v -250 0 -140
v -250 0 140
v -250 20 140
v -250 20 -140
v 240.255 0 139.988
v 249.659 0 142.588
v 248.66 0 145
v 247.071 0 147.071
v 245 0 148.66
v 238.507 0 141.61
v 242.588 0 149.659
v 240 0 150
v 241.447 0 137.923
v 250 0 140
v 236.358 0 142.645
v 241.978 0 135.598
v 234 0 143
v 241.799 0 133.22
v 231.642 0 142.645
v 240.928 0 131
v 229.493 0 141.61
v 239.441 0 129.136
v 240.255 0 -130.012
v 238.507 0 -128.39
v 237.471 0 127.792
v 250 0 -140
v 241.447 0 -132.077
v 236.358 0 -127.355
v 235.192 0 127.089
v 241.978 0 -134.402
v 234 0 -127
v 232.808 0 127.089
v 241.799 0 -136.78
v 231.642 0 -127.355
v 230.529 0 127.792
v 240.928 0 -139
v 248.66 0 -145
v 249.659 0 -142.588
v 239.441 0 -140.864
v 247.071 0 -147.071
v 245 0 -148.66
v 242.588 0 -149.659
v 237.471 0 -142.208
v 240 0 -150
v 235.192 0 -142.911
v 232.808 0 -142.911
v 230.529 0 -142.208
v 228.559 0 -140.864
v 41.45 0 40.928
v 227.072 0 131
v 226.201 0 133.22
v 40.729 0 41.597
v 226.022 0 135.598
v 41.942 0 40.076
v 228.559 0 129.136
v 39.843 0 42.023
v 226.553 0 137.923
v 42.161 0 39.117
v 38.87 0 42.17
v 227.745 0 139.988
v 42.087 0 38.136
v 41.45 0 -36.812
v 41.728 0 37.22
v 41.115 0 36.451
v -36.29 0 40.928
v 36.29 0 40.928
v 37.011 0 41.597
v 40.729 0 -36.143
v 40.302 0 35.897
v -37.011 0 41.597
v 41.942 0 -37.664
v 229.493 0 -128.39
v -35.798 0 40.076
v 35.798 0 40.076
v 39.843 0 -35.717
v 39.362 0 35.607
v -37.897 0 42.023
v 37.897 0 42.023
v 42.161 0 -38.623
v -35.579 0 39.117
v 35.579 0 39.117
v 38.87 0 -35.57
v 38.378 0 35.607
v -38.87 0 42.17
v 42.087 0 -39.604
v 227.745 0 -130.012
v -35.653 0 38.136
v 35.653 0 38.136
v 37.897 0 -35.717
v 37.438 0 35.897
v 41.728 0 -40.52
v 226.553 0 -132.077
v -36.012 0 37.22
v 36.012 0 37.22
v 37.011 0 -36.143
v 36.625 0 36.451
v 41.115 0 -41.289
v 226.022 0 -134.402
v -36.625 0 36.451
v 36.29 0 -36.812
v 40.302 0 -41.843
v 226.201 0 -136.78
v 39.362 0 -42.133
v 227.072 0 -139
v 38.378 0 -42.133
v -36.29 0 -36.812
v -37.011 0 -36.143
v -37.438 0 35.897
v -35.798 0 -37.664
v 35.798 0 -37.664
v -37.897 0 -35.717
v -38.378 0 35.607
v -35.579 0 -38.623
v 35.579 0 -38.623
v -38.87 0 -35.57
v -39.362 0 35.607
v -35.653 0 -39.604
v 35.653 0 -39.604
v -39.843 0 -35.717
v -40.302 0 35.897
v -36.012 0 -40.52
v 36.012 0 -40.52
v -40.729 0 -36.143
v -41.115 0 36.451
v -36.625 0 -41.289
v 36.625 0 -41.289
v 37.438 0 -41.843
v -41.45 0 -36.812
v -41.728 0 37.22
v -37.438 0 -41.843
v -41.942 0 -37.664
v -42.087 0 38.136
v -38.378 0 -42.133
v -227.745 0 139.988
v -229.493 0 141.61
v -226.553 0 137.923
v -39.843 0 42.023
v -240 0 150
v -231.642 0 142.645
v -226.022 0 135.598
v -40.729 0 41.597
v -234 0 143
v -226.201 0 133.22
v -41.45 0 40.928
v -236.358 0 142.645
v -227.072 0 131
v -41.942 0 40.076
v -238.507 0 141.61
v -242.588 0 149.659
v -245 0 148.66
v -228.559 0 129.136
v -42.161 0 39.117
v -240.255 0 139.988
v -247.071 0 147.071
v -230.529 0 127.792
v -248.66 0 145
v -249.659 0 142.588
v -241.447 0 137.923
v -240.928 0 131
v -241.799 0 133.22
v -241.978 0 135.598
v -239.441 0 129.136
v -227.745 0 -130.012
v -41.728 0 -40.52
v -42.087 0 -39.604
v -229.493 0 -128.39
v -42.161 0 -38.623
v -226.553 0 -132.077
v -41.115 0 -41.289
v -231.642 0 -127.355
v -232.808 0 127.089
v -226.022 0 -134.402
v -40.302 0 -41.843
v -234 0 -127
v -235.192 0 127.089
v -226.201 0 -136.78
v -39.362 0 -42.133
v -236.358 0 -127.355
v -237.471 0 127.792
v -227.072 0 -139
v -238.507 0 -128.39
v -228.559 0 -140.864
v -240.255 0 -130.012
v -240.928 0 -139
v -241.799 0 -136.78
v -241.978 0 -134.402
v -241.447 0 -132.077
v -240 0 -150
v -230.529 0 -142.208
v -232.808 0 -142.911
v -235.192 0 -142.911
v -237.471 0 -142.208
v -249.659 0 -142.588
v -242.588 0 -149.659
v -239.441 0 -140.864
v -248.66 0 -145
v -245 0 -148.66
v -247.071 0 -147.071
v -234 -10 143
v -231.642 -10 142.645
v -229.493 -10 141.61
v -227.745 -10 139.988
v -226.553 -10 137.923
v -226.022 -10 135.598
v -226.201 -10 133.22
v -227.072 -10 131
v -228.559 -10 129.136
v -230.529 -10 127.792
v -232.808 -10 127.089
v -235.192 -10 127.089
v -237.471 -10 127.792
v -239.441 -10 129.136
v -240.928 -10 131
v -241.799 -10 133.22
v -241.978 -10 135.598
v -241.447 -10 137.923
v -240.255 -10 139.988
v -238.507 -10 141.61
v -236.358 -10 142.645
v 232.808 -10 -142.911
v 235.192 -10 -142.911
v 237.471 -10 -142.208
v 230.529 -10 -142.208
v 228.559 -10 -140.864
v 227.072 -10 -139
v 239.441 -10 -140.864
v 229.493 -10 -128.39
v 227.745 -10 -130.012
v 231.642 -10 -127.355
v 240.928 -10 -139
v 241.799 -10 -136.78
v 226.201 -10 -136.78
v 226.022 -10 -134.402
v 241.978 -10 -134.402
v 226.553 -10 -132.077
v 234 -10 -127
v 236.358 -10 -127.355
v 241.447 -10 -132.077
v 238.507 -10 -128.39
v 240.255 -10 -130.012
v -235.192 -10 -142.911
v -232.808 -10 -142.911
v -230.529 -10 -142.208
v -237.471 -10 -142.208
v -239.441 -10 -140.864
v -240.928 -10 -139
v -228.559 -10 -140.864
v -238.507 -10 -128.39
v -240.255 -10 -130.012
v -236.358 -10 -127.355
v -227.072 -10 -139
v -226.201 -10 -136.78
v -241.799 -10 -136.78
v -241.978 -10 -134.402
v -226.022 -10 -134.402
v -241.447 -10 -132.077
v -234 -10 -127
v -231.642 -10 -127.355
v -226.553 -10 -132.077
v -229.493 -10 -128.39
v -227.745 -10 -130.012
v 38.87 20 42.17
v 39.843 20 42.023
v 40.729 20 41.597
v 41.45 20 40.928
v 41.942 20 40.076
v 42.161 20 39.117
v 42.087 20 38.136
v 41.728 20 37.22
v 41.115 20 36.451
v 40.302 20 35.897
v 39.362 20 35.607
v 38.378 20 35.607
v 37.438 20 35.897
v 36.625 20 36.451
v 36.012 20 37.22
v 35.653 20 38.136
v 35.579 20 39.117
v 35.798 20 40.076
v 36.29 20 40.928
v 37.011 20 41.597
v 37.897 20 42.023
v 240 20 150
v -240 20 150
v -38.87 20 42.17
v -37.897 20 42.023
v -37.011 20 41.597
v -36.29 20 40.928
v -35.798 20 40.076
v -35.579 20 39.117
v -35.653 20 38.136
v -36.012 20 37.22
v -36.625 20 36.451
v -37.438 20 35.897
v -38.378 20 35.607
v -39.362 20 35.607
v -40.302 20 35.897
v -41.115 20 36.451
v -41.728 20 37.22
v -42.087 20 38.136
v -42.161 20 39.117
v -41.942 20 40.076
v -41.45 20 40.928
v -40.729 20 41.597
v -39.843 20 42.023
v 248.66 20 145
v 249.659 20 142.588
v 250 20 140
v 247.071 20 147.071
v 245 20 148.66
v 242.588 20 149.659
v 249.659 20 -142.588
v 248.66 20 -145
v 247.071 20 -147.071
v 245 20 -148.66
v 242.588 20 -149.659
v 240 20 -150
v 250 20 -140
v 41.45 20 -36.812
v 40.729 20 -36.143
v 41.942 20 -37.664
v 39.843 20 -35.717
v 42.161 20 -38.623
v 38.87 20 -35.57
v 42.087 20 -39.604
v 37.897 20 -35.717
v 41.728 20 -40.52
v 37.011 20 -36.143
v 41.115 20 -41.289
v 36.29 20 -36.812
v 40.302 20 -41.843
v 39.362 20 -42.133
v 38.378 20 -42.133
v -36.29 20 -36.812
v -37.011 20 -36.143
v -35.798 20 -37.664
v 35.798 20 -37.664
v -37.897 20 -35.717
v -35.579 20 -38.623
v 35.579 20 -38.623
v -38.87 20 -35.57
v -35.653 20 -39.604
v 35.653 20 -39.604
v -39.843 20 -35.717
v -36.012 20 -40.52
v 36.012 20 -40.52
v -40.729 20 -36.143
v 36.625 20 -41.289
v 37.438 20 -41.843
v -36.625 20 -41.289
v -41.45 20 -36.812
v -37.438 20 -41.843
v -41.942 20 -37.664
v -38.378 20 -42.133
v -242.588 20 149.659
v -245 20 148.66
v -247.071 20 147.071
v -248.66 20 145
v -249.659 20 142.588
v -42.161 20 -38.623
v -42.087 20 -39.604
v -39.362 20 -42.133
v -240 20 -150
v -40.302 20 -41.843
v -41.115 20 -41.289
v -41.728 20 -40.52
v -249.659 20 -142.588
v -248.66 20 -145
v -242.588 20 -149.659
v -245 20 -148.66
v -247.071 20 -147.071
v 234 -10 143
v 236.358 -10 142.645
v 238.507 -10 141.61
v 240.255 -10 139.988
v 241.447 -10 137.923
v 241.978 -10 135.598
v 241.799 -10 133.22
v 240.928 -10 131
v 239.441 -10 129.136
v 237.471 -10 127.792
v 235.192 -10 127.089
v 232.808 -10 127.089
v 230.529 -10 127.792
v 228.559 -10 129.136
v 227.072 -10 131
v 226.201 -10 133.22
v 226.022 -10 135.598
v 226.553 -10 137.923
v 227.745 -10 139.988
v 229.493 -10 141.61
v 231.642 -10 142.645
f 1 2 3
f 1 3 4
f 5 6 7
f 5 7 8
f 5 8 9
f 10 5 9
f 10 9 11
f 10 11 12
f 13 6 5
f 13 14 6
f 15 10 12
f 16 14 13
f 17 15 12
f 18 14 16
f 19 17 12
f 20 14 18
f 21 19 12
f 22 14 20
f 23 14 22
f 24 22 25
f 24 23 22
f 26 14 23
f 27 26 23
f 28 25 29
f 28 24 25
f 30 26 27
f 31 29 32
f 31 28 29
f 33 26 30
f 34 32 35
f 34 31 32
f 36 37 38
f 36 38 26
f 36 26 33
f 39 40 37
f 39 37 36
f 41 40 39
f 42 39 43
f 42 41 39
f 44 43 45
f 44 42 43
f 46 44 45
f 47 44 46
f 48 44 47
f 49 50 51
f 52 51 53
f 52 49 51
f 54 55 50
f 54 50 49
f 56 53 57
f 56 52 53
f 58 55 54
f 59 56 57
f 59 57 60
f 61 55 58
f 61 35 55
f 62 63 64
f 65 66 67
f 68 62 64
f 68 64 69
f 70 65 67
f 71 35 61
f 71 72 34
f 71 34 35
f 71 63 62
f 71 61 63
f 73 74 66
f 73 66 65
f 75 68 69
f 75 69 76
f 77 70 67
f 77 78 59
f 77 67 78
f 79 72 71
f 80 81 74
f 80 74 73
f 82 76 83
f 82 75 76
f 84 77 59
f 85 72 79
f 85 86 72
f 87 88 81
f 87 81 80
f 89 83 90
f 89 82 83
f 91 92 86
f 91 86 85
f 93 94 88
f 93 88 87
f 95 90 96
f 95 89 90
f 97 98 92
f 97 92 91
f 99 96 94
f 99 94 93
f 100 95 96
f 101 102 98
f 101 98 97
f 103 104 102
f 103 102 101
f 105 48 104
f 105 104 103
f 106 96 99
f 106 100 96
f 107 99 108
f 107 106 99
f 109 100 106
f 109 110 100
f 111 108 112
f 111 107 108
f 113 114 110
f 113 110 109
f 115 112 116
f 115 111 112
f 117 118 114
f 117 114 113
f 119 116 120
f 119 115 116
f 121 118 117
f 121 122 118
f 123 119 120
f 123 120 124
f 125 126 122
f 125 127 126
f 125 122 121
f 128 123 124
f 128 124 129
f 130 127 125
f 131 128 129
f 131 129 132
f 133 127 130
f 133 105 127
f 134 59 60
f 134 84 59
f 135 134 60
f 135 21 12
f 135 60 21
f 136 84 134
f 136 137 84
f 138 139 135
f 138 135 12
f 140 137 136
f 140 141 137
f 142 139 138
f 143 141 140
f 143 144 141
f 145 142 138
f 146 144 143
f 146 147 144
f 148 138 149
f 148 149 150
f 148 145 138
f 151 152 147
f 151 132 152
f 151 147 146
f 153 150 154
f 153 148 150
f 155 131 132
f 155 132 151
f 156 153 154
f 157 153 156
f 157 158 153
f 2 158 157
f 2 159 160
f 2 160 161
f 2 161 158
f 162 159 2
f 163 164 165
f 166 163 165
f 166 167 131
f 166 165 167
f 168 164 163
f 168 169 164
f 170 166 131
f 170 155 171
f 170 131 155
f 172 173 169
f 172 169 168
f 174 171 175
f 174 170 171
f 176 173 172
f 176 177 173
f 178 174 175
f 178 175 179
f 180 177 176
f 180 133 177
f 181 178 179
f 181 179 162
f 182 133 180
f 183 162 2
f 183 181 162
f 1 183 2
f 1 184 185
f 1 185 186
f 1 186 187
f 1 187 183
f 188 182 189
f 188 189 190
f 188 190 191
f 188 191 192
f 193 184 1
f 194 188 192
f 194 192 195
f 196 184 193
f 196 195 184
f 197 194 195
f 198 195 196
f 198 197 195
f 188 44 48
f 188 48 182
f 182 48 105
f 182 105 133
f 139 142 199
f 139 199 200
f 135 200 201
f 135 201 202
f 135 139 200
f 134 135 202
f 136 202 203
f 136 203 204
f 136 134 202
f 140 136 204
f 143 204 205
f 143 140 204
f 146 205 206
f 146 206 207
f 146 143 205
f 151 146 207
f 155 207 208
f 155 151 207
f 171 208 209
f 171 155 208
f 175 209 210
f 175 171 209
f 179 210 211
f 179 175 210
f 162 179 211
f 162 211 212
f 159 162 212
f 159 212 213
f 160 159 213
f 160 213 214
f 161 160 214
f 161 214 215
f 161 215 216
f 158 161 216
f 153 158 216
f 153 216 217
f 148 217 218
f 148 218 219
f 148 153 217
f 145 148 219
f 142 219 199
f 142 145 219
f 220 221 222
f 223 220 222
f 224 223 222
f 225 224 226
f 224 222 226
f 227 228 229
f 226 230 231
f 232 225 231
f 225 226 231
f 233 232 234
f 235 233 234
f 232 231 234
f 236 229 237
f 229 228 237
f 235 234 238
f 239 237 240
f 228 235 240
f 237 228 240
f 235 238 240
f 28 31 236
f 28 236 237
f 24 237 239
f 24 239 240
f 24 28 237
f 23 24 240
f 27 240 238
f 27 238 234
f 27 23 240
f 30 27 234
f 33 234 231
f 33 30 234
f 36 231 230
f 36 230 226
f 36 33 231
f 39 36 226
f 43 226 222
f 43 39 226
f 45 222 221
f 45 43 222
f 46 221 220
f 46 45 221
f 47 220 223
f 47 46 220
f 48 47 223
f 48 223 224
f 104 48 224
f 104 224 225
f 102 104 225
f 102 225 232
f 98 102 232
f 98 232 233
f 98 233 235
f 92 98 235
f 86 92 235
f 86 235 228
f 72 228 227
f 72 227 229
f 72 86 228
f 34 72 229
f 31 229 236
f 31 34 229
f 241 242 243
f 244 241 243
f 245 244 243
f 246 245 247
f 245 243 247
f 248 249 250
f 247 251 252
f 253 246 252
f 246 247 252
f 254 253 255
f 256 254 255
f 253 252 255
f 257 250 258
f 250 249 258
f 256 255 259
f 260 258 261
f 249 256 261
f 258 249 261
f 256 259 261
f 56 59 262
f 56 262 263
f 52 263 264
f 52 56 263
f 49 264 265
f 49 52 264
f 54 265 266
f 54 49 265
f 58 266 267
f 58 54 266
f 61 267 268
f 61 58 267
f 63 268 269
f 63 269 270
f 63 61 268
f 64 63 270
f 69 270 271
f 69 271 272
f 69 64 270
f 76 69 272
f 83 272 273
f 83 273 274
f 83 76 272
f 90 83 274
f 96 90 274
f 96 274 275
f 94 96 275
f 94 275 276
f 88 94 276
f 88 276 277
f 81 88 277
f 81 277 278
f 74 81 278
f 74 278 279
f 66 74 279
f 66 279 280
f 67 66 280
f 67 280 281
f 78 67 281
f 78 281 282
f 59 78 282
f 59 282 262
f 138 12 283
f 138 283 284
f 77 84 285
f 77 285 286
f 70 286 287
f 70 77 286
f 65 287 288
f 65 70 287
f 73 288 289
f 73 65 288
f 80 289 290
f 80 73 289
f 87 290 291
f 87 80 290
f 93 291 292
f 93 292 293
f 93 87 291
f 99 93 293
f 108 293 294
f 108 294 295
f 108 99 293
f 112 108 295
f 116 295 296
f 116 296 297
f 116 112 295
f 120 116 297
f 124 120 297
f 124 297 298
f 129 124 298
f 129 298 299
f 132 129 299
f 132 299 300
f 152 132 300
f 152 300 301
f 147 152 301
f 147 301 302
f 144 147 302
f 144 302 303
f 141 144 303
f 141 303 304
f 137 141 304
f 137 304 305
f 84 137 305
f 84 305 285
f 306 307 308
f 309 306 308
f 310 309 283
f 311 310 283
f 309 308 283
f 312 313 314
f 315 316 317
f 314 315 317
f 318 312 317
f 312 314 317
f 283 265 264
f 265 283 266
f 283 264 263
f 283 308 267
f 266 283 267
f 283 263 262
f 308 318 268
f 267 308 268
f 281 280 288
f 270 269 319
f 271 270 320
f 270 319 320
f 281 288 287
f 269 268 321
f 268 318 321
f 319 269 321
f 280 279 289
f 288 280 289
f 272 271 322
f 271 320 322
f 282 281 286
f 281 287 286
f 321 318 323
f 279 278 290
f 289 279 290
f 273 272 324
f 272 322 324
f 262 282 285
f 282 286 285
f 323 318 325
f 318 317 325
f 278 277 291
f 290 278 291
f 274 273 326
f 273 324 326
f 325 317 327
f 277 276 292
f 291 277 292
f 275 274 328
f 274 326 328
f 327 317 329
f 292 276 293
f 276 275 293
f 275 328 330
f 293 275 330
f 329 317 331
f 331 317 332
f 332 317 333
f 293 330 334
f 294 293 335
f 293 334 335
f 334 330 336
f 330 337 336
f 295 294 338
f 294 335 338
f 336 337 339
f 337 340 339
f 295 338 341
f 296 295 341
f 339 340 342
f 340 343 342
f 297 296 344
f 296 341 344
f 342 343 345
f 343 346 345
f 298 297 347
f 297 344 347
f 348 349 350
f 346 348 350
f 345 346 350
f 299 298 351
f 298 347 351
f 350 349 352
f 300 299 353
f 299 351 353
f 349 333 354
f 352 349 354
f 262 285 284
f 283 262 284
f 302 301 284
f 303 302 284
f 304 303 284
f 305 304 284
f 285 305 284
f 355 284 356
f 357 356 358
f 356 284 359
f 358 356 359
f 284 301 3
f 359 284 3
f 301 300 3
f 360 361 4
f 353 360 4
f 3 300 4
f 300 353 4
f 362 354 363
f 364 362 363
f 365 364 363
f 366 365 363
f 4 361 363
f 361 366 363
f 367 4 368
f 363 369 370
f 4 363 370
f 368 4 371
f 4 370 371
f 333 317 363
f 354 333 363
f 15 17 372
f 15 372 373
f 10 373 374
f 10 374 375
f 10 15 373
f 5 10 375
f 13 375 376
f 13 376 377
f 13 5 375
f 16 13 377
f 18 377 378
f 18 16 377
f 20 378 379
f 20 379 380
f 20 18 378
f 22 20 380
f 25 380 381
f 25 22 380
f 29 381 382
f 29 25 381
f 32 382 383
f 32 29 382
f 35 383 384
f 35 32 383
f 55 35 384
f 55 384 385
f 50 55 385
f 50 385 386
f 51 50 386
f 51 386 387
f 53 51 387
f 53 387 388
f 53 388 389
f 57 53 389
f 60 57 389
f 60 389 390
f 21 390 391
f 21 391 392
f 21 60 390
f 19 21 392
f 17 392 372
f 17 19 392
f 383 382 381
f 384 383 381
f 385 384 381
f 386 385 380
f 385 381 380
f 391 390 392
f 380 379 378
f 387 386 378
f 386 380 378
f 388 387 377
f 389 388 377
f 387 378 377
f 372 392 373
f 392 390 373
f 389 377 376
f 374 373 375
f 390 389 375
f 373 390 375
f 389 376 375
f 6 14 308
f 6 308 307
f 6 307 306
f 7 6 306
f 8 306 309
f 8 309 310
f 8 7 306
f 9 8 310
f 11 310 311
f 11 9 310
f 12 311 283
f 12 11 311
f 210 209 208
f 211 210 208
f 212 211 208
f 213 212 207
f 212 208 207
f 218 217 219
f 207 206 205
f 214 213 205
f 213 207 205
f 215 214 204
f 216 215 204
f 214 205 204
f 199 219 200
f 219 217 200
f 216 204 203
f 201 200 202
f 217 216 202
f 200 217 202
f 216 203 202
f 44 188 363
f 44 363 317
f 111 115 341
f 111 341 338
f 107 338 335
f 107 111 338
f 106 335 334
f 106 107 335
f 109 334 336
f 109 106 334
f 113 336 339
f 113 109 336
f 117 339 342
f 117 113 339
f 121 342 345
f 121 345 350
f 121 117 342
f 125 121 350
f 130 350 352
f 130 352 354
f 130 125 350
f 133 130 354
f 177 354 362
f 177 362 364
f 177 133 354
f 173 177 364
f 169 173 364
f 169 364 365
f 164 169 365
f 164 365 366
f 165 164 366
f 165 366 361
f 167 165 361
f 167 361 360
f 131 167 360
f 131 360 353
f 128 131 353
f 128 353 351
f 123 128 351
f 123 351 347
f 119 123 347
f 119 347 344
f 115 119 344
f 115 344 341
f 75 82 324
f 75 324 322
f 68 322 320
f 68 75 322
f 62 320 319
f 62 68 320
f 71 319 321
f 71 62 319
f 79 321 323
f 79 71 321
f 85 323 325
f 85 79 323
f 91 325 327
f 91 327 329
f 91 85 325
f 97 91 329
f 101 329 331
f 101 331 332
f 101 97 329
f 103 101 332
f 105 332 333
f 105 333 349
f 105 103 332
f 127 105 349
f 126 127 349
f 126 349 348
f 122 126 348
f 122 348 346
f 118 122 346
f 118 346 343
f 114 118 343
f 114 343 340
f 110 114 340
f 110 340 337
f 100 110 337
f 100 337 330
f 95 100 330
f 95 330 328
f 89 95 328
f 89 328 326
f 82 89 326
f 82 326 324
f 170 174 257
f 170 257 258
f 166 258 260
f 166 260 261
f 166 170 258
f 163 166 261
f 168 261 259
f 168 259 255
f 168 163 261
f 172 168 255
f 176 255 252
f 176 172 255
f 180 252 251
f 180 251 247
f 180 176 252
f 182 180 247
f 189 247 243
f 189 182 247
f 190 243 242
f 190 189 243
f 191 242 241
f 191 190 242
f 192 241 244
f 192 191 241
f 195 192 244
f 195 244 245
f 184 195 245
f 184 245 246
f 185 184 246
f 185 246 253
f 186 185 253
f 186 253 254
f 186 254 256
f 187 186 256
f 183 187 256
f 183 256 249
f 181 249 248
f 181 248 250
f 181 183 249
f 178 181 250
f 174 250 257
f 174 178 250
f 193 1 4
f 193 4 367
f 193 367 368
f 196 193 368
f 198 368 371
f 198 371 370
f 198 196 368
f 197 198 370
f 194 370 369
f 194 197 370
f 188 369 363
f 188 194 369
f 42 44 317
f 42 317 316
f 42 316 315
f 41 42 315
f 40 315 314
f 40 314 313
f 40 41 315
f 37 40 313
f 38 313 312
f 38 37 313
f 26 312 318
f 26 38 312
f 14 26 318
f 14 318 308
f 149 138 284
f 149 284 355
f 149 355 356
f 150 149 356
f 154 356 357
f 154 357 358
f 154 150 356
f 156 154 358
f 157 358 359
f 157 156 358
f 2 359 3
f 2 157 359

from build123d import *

# Parameters (mm, degrees)
BOSS_EXTRUDE1_DEPTH     = 20
CUT_EXTRUDE2_DEPTH      = 20
CUT_EXTRUDE2_DEPTH_BACK = 293.232783924
SKETCH2_R               = 3.3
SKETCH3_R               = 8
BOSS_EXTRUDE2_DEPTH     = 10


with BuildPart() as part:
    # Sketch1 → Boss-Extrude1 (new body)
    with BuildSketch(Plane(origin=(0, 0, 0), x_dir=(1, 0, 0), z_dir=(0, 1, 0))):
        with BuildLine():
            Line((240, -150), (-240, -150))
            ThreePointArc((-240, -150), (-247.071067812, -147.071067812), (-250, -140))
            Line((-250, -140), (-250, 140))
            ThreePointArc((-250, 140), (-247.071067812, 147.071067812), (-240, 150))
            Line((-240, 150), (240, 150))
            ThreePointArc((240, 150), (247.071067812, 147.071067812), (250, 140))
            Line((250, 140), (250, -140))
            ThreePointArc((250, -140), (247.071067812, -147.071067812), (240, -150))
        make_face()
    extrude(amount=BOSS_EXTRUDE1_DEPTH)

    # Sketch2 → Cut-Extrude2 (cut, two sides: drawn at the far end of the back side and taken through both)
    with BuildSketch(Plane(origin=(0, 0, 0), x_dir=(1, 0, 0), z_dir=(0, 1, 0)).offset(-CUT_EXTRUDE2_DEPTH_BACK)):
        with Locations(Location((-38.87, -38.87, 0), (0, 0, 270))):
            Circle(SKETCH2_R)
        with Locations(Location((38.87, -38.87, 0), (0, 0, 270))):
            Circle(SKETCH2_R)
        with Locations(Location((38.87, 38.87, 0), (0, 0, 270))):
            Circle(SKETCH2_R)
        with Locations(Location((-38.87, 38.87, 0), (0, 0, 270))):
            Circle(SKETCH2_R)
    extrude(amount=CUT_EXTRUDE2_DEPTH + CUT_EXTRUDE2_DEPTH_BACK, mode=Mode.SUBTRACT)

    # Sketch3 → Boss-Extrude2 (add)
    with BuildSketch(Plane(origin=(0, 0, 0), x_dir=(1, 0, 0), z_dir=(0, 1, 0))):
        with Locations(Location((-234, 135, 0), (0, 0, 270))):
            Circle(SKETCH3_R)
        with Locations(Location((234, 135, 0), (0, 0, 270))):
            Circle(SKETCH3_R)
        with Locations(Location((234, -135, 0), (0, 0, 270))):
            Circle(SKETCH3_R)
        with Locations(Location((-234, -135, 0), (0, 0, 270))):
            Circle(SKETCH3_R)
    extrude(amount=-BOSS_EXTRUDE2_DEPTH)


solid = part.part
